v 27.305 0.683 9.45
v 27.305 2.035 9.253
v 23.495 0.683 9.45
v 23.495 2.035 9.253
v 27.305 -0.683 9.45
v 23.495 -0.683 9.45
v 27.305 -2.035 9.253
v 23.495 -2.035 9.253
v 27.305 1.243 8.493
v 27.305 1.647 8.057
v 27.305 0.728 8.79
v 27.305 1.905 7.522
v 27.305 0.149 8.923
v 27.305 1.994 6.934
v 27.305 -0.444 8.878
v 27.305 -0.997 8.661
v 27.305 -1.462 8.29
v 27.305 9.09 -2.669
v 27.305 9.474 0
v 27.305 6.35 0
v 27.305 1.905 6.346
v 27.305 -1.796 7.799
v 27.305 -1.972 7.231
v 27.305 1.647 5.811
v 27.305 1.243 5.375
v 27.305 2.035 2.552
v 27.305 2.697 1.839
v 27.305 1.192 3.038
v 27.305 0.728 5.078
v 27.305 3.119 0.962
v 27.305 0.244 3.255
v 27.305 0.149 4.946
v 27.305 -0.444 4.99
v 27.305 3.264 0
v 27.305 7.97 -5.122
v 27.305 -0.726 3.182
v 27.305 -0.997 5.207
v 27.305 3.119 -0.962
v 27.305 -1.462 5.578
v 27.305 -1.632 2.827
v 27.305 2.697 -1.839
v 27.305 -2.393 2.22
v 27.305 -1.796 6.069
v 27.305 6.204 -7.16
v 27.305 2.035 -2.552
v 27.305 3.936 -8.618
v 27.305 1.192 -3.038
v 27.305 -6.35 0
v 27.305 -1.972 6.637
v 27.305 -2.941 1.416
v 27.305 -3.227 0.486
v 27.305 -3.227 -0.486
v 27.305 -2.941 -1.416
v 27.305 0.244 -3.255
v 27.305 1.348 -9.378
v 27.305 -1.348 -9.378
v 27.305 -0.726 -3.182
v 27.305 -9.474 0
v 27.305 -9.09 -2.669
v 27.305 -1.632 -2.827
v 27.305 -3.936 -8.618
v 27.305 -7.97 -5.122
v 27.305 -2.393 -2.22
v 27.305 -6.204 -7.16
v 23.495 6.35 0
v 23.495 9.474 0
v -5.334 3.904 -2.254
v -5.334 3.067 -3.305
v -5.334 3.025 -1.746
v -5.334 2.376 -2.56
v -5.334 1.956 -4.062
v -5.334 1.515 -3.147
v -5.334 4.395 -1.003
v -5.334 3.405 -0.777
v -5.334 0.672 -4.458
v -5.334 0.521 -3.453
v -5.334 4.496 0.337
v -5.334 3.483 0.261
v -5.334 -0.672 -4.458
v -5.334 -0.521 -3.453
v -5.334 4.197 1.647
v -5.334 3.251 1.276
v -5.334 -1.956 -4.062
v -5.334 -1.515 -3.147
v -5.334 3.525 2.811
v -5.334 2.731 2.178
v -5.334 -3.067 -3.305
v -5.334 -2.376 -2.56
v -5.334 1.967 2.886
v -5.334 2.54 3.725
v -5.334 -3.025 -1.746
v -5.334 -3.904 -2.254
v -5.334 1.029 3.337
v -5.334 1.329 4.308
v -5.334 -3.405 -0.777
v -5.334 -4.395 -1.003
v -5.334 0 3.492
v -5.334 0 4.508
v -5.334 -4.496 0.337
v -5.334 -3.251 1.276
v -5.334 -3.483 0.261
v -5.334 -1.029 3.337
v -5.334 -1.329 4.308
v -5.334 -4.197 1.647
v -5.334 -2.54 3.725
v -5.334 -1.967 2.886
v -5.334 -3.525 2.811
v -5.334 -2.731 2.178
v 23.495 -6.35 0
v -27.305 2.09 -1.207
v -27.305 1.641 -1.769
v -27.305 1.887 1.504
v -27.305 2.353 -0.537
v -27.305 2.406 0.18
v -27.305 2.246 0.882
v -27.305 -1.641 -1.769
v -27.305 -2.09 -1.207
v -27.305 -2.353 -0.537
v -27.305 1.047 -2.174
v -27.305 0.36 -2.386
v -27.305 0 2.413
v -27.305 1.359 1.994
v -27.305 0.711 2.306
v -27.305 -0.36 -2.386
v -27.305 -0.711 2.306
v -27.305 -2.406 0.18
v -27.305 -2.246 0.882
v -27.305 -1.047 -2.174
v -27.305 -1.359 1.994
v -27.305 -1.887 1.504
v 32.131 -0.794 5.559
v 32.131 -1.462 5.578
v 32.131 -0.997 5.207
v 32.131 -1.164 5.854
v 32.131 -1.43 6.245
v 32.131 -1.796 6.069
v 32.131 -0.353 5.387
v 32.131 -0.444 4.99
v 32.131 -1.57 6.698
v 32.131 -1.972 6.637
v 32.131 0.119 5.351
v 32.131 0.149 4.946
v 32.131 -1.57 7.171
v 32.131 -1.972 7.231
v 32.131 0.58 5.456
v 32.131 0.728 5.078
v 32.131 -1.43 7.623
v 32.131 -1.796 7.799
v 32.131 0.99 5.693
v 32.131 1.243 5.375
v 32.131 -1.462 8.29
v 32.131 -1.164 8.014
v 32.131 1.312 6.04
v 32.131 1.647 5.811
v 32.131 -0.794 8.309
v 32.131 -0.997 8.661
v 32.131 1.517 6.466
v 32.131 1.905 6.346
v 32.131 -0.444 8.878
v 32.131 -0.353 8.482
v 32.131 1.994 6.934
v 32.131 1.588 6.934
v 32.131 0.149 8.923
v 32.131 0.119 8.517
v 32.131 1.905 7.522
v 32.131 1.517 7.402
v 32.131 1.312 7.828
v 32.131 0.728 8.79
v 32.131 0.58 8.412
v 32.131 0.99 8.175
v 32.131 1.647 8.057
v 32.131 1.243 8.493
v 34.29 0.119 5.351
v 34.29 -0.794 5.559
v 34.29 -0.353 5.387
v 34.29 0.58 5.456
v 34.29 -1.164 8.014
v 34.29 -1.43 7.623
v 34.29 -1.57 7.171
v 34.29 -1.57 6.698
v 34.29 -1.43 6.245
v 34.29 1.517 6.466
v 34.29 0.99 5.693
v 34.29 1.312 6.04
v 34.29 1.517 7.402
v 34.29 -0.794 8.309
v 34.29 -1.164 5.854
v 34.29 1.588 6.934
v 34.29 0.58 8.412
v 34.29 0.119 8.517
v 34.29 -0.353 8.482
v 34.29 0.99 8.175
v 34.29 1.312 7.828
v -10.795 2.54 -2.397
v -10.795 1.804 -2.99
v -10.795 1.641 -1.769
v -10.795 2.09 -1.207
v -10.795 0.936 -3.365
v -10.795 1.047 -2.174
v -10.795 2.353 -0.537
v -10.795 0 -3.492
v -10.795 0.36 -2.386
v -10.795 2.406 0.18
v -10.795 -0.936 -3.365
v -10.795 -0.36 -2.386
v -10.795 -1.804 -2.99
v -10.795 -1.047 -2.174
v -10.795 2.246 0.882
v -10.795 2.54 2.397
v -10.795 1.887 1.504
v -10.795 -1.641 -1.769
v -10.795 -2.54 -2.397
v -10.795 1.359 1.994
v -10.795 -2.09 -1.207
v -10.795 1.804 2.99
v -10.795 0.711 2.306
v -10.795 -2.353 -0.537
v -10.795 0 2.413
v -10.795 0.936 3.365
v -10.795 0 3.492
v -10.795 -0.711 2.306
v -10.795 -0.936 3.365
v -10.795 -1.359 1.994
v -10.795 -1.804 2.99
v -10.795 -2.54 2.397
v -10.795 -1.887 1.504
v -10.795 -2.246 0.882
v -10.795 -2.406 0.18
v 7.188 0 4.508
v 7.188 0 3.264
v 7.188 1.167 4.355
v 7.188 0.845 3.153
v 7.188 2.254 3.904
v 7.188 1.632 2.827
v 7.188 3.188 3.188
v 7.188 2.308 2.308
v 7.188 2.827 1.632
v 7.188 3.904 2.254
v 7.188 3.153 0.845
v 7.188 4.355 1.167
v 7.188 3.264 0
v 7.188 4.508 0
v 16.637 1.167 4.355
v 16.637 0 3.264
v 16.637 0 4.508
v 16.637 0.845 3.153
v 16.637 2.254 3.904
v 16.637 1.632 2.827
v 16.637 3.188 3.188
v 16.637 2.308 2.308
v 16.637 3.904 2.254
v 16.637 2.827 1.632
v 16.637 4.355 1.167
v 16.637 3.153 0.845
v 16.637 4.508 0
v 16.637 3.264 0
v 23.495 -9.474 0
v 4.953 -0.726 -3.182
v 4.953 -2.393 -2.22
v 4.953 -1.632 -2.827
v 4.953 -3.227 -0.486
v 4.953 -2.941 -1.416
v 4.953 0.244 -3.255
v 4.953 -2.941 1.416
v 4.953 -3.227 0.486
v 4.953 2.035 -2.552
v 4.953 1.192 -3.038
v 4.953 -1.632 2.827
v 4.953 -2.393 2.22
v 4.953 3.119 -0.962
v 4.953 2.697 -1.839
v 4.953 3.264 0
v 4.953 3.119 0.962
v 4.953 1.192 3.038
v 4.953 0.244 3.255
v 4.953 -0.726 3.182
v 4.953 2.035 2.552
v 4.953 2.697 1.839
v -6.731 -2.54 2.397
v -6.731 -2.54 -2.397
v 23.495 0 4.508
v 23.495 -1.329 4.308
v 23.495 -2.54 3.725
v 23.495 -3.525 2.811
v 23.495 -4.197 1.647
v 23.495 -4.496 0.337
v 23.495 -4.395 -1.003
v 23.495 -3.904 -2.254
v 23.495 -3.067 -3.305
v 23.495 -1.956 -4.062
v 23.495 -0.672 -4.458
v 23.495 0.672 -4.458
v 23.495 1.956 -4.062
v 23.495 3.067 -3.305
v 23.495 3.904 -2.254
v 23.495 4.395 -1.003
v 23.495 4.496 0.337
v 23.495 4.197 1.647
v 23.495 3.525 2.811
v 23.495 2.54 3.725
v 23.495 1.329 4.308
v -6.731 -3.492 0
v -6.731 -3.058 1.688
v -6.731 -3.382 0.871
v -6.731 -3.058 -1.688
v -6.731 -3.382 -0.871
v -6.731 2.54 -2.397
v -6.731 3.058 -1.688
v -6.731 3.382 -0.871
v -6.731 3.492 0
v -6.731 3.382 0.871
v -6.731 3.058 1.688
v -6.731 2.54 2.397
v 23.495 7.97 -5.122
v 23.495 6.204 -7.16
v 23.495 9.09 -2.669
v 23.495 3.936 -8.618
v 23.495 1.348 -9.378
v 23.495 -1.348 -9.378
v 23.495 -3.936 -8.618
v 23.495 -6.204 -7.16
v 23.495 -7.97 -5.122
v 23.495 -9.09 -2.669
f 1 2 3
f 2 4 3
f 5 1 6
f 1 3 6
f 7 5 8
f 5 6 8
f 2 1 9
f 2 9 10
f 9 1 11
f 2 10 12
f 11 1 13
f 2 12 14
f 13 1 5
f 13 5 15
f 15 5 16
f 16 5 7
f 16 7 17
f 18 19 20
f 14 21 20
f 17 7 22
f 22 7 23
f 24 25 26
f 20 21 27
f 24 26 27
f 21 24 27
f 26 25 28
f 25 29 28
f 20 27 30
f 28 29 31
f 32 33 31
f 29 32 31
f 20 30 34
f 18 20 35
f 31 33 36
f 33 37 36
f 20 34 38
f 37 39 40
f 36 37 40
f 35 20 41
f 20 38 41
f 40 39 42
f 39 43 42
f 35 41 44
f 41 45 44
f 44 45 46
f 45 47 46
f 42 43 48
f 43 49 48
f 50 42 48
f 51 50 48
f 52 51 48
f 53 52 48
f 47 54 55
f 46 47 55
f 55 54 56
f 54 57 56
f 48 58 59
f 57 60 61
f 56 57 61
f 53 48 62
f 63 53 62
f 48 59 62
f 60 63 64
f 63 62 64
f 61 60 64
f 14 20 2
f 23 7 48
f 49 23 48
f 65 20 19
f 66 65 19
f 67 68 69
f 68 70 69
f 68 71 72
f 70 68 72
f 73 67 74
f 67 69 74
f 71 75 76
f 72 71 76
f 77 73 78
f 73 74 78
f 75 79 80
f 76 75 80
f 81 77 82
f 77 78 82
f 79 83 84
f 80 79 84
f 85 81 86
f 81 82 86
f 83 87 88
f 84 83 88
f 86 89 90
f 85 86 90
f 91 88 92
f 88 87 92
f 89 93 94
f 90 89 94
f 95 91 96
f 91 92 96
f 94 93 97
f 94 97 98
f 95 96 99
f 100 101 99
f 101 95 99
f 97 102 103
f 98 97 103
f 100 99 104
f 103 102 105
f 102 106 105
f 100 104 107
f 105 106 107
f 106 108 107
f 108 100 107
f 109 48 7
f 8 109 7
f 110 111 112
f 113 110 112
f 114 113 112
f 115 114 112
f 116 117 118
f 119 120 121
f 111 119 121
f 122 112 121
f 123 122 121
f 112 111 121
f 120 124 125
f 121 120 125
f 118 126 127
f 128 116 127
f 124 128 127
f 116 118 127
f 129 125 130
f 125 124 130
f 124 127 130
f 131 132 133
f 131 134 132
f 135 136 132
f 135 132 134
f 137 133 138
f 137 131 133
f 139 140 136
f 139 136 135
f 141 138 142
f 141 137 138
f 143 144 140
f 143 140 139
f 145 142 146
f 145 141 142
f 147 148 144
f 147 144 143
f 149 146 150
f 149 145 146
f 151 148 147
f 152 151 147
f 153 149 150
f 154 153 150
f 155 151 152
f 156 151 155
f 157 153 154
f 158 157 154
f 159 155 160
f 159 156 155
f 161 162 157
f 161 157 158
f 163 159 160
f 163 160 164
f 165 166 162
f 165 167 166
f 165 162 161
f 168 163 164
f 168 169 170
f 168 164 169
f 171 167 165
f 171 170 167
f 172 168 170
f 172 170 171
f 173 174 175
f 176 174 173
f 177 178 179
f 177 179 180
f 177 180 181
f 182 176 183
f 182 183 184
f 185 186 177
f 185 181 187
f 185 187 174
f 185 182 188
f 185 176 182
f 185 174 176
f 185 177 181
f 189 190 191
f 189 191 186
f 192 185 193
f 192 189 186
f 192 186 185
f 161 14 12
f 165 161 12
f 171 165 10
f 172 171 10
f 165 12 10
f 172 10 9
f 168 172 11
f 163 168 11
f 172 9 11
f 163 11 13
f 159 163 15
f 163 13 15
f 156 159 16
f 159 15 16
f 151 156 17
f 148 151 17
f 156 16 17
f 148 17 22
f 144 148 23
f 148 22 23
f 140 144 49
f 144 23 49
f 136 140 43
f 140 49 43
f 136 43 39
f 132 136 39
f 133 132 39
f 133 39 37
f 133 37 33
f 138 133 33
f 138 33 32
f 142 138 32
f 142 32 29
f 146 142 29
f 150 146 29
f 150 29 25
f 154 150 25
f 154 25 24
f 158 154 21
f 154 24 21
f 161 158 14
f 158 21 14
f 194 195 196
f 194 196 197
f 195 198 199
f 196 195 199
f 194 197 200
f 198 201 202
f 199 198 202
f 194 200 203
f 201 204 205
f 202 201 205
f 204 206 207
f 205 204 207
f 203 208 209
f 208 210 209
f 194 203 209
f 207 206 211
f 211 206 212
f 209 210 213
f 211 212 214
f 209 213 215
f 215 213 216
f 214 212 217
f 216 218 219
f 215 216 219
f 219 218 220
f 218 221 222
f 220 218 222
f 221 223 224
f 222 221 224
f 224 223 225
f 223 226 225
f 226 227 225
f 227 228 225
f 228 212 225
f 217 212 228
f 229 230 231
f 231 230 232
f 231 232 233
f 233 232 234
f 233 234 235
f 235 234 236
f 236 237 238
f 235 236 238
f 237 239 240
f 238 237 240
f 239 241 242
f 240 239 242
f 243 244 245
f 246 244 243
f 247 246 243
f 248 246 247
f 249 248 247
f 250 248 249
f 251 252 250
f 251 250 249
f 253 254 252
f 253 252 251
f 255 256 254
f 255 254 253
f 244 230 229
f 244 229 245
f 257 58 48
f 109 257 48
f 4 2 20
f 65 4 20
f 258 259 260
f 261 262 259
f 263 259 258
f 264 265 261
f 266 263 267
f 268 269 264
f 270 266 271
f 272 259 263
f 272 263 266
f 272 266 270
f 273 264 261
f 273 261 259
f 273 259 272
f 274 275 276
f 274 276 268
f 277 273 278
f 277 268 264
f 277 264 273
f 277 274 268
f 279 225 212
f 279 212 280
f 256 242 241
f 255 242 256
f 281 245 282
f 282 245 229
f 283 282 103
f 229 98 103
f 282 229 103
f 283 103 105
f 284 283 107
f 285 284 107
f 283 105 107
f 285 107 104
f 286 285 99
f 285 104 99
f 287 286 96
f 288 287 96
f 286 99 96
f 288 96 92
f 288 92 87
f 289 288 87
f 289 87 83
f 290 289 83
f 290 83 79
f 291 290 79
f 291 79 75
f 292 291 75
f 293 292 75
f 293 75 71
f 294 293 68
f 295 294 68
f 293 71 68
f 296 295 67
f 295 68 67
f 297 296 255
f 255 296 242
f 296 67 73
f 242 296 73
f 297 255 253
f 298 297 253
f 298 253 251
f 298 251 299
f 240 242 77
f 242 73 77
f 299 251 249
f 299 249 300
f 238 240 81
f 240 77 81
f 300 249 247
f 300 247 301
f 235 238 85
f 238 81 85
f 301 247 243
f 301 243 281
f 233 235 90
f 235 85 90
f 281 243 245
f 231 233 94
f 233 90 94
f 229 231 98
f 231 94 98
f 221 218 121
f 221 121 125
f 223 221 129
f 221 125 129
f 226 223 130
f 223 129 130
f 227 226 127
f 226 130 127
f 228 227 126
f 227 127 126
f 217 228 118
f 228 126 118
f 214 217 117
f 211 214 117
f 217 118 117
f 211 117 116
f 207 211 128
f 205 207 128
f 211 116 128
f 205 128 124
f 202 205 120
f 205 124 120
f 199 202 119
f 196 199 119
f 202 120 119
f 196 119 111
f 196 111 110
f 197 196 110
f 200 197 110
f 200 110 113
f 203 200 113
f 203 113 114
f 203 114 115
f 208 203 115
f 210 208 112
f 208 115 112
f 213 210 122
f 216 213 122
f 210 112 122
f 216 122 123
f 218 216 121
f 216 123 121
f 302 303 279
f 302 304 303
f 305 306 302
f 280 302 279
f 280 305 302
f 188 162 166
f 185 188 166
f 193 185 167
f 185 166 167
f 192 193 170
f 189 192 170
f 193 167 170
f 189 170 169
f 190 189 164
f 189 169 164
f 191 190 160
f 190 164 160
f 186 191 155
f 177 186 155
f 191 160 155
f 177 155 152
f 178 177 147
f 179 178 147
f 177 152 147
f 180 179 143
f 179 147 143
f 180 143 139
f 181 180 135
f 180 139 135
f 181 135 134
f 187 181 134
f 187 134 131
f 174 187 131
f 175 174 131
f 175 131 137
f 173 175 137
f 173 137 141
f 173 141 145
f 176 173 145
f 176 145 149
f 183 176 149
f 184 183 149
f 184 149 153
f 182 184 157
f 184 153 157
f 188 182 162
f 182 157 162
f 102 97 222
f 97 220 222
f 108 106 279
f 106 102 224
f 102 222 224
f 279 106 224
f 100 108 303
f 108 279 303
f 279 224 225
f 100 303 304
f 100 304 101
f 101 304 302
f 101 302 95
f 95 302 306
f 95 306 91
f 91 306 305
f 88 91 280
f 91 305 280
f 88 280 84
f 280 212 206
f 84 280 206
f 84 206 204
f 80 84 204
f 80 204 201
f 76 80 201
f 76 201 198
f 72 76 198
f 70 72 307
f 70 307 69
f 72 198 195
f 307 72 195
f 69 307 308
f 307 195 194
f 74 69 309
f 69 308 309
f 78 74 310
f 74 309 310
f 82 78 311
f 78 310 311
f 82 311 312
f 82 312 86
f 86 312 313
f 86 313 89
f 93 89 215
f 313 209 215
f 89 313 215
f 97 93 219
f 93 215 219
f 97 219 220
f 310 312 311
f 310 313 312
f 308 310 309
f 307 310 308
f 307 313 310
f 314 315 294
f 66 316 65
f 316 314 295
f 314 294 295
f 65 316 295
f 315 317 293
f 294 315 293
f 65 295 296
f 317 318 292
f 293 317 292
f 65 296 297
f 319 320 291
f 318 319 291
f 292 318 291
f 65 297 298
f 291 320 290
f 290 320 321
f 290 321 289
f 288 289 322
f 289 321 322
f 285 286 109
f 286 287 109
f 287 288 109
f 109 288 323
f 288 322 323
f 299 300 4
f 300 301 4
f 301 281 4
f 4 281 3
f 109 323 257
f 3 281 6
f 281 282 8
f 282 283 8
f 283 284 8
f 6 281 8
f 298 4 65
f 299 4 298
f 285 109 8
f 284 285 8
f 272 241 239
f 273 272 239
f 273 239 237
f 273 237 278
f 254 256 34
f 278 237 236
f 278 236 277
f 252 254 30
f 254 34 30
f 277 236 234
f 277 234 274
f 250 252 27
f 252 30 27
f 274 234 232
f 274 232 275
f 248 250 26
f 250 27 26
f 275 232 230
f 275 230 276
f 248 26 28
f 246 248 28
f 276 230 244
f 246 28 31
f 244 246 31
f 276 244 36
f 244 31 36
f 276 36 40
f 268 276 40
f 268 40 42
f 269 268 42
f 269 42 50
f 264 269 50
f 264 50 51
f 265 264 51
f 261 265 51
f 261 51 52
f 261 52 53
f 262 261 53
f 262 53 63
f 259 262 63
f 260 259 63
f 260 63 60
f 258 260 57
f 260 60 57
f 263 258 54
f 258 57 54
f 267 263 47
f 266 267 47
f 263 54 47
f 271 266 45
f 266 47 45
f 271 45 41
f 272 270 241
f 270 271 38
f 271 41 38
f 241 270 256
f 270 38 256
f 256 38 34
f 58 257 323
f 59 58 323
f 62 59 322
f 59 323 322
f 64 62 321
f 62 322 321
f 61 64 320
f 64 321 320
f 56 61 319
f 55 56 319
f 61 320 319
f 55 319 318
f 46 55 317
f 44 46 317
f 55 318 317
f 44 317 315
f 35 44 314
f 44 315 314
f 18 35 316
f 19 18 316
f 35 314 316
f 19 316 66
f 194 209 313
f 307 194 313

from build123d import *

# Parameters (mm, degrees)
F3_DEPTH       = 3.81
F4_R           = 3.2639
F5_DEPTH       = 22.352
F6_R           = 1.9939
F7_DEPTH       = 4.826
F8_R           = 1.5875
F9_DEPTH       = 2.159
F10_W          = 9.4488
F10_H          = 4.5085
F11_DEPTH      = 25.4
F12_W          = 4.064
F12_H          = 3.81
F13_DEPTH      = 9.4752
F13_DEPTH_BACK = 9.4752


with BuildPart() as f1:
    # F0 (on Front) → F1 (revolve)
    with BuildSketch(Plane.XZ):
        Polygon((-27.305, 2.413), (-27.305, 0), (27.305, 0), (27.305, 9.4742), (23.495, 9.4742), (23.495, 4.5085), (-5.334, 4.5085), (-5.334, 3.4925), (-10.795, 3.4925), (-10.795, 2.413), align=None)
    revolve(axis=Axis((0, 0, 0), (1, 0, 0)))

    # F2 (on face) → F3 (cut, through all)
    with BuildSketch(Plane.YZ.offset(27.305)):
        with BuildLine():
            ThreePointArc((-2.0352498271, 9.253011606), (-7.3838617793, 5.9362488883), (-9.4742, 0))
            Line((-9.4742, 0), (-6.35, 0))
            Line((-6.35, 0), (-2.0352498271, 9.253011606))
        make_face()
        with BuildLine():
            Line((6.35, 0), (9.4742, 0))
            ThreePointArc((9.4742, 0), (7.3838617793, 5.9362488883), (2.0352498271, 9.253011606))
            Line((2.0352498271, 9.253011606), (6.35, 0))
        make_face()
    extrude(amount=-F3_DEPTH, mode=Mode.SUBTRACT)

    # F4 (on face) → F5 (cut)
    with BuildSketch(Plane.YZ.offset(27.305)):
        Circle(F4_R)
    extrude(amount=-F5_DEPTH, mode=Mode.SUBTRACT)

    # F6 (on face) → F7 (join)
    with BuildSketch(Plane.YZ.offset(27.305)):
        with Locations((0, 6.9342)):
            Circle(F6_R)
    extrude(amount=F7_DEPTH)

    # F8 (on face) → F9 (join)
    with BuildSketch(Plane.YZ.offset(32.131)):
        with Locations((0, 6.9342)):
            Circle(F8_R)
    extrude(amount=F9_DEPTH)

    # F10 (on Top) → F11 (cut)
    with BuildSketch(Plane.XY):
        with Locations((11.9126, 2.25425)):
            Rectangle(F10_W, F10_H)
    extrude(amount=F11_DEPTH, mode=Mode.SUBTRACT)

    # F12 (on Top) → F13 (cut, two sides)
    with BuildSketch(Plane.XY) as f13_sk:
        with Locations((-8.763, -4.445)):
            Rectangle(F12_W, F12_H)
        with Locations((-8.763, 4.445)):
            Rectangle(F12_W, F12_H)
    extrude(amount=-F13_DEPTH, mode=Mode.SUBTRACT)
    extrude(f13_sk.sketch, amount=F13_DEPTH_BACK, mode=Mode.SUBTRACT)


solid = f1.part
